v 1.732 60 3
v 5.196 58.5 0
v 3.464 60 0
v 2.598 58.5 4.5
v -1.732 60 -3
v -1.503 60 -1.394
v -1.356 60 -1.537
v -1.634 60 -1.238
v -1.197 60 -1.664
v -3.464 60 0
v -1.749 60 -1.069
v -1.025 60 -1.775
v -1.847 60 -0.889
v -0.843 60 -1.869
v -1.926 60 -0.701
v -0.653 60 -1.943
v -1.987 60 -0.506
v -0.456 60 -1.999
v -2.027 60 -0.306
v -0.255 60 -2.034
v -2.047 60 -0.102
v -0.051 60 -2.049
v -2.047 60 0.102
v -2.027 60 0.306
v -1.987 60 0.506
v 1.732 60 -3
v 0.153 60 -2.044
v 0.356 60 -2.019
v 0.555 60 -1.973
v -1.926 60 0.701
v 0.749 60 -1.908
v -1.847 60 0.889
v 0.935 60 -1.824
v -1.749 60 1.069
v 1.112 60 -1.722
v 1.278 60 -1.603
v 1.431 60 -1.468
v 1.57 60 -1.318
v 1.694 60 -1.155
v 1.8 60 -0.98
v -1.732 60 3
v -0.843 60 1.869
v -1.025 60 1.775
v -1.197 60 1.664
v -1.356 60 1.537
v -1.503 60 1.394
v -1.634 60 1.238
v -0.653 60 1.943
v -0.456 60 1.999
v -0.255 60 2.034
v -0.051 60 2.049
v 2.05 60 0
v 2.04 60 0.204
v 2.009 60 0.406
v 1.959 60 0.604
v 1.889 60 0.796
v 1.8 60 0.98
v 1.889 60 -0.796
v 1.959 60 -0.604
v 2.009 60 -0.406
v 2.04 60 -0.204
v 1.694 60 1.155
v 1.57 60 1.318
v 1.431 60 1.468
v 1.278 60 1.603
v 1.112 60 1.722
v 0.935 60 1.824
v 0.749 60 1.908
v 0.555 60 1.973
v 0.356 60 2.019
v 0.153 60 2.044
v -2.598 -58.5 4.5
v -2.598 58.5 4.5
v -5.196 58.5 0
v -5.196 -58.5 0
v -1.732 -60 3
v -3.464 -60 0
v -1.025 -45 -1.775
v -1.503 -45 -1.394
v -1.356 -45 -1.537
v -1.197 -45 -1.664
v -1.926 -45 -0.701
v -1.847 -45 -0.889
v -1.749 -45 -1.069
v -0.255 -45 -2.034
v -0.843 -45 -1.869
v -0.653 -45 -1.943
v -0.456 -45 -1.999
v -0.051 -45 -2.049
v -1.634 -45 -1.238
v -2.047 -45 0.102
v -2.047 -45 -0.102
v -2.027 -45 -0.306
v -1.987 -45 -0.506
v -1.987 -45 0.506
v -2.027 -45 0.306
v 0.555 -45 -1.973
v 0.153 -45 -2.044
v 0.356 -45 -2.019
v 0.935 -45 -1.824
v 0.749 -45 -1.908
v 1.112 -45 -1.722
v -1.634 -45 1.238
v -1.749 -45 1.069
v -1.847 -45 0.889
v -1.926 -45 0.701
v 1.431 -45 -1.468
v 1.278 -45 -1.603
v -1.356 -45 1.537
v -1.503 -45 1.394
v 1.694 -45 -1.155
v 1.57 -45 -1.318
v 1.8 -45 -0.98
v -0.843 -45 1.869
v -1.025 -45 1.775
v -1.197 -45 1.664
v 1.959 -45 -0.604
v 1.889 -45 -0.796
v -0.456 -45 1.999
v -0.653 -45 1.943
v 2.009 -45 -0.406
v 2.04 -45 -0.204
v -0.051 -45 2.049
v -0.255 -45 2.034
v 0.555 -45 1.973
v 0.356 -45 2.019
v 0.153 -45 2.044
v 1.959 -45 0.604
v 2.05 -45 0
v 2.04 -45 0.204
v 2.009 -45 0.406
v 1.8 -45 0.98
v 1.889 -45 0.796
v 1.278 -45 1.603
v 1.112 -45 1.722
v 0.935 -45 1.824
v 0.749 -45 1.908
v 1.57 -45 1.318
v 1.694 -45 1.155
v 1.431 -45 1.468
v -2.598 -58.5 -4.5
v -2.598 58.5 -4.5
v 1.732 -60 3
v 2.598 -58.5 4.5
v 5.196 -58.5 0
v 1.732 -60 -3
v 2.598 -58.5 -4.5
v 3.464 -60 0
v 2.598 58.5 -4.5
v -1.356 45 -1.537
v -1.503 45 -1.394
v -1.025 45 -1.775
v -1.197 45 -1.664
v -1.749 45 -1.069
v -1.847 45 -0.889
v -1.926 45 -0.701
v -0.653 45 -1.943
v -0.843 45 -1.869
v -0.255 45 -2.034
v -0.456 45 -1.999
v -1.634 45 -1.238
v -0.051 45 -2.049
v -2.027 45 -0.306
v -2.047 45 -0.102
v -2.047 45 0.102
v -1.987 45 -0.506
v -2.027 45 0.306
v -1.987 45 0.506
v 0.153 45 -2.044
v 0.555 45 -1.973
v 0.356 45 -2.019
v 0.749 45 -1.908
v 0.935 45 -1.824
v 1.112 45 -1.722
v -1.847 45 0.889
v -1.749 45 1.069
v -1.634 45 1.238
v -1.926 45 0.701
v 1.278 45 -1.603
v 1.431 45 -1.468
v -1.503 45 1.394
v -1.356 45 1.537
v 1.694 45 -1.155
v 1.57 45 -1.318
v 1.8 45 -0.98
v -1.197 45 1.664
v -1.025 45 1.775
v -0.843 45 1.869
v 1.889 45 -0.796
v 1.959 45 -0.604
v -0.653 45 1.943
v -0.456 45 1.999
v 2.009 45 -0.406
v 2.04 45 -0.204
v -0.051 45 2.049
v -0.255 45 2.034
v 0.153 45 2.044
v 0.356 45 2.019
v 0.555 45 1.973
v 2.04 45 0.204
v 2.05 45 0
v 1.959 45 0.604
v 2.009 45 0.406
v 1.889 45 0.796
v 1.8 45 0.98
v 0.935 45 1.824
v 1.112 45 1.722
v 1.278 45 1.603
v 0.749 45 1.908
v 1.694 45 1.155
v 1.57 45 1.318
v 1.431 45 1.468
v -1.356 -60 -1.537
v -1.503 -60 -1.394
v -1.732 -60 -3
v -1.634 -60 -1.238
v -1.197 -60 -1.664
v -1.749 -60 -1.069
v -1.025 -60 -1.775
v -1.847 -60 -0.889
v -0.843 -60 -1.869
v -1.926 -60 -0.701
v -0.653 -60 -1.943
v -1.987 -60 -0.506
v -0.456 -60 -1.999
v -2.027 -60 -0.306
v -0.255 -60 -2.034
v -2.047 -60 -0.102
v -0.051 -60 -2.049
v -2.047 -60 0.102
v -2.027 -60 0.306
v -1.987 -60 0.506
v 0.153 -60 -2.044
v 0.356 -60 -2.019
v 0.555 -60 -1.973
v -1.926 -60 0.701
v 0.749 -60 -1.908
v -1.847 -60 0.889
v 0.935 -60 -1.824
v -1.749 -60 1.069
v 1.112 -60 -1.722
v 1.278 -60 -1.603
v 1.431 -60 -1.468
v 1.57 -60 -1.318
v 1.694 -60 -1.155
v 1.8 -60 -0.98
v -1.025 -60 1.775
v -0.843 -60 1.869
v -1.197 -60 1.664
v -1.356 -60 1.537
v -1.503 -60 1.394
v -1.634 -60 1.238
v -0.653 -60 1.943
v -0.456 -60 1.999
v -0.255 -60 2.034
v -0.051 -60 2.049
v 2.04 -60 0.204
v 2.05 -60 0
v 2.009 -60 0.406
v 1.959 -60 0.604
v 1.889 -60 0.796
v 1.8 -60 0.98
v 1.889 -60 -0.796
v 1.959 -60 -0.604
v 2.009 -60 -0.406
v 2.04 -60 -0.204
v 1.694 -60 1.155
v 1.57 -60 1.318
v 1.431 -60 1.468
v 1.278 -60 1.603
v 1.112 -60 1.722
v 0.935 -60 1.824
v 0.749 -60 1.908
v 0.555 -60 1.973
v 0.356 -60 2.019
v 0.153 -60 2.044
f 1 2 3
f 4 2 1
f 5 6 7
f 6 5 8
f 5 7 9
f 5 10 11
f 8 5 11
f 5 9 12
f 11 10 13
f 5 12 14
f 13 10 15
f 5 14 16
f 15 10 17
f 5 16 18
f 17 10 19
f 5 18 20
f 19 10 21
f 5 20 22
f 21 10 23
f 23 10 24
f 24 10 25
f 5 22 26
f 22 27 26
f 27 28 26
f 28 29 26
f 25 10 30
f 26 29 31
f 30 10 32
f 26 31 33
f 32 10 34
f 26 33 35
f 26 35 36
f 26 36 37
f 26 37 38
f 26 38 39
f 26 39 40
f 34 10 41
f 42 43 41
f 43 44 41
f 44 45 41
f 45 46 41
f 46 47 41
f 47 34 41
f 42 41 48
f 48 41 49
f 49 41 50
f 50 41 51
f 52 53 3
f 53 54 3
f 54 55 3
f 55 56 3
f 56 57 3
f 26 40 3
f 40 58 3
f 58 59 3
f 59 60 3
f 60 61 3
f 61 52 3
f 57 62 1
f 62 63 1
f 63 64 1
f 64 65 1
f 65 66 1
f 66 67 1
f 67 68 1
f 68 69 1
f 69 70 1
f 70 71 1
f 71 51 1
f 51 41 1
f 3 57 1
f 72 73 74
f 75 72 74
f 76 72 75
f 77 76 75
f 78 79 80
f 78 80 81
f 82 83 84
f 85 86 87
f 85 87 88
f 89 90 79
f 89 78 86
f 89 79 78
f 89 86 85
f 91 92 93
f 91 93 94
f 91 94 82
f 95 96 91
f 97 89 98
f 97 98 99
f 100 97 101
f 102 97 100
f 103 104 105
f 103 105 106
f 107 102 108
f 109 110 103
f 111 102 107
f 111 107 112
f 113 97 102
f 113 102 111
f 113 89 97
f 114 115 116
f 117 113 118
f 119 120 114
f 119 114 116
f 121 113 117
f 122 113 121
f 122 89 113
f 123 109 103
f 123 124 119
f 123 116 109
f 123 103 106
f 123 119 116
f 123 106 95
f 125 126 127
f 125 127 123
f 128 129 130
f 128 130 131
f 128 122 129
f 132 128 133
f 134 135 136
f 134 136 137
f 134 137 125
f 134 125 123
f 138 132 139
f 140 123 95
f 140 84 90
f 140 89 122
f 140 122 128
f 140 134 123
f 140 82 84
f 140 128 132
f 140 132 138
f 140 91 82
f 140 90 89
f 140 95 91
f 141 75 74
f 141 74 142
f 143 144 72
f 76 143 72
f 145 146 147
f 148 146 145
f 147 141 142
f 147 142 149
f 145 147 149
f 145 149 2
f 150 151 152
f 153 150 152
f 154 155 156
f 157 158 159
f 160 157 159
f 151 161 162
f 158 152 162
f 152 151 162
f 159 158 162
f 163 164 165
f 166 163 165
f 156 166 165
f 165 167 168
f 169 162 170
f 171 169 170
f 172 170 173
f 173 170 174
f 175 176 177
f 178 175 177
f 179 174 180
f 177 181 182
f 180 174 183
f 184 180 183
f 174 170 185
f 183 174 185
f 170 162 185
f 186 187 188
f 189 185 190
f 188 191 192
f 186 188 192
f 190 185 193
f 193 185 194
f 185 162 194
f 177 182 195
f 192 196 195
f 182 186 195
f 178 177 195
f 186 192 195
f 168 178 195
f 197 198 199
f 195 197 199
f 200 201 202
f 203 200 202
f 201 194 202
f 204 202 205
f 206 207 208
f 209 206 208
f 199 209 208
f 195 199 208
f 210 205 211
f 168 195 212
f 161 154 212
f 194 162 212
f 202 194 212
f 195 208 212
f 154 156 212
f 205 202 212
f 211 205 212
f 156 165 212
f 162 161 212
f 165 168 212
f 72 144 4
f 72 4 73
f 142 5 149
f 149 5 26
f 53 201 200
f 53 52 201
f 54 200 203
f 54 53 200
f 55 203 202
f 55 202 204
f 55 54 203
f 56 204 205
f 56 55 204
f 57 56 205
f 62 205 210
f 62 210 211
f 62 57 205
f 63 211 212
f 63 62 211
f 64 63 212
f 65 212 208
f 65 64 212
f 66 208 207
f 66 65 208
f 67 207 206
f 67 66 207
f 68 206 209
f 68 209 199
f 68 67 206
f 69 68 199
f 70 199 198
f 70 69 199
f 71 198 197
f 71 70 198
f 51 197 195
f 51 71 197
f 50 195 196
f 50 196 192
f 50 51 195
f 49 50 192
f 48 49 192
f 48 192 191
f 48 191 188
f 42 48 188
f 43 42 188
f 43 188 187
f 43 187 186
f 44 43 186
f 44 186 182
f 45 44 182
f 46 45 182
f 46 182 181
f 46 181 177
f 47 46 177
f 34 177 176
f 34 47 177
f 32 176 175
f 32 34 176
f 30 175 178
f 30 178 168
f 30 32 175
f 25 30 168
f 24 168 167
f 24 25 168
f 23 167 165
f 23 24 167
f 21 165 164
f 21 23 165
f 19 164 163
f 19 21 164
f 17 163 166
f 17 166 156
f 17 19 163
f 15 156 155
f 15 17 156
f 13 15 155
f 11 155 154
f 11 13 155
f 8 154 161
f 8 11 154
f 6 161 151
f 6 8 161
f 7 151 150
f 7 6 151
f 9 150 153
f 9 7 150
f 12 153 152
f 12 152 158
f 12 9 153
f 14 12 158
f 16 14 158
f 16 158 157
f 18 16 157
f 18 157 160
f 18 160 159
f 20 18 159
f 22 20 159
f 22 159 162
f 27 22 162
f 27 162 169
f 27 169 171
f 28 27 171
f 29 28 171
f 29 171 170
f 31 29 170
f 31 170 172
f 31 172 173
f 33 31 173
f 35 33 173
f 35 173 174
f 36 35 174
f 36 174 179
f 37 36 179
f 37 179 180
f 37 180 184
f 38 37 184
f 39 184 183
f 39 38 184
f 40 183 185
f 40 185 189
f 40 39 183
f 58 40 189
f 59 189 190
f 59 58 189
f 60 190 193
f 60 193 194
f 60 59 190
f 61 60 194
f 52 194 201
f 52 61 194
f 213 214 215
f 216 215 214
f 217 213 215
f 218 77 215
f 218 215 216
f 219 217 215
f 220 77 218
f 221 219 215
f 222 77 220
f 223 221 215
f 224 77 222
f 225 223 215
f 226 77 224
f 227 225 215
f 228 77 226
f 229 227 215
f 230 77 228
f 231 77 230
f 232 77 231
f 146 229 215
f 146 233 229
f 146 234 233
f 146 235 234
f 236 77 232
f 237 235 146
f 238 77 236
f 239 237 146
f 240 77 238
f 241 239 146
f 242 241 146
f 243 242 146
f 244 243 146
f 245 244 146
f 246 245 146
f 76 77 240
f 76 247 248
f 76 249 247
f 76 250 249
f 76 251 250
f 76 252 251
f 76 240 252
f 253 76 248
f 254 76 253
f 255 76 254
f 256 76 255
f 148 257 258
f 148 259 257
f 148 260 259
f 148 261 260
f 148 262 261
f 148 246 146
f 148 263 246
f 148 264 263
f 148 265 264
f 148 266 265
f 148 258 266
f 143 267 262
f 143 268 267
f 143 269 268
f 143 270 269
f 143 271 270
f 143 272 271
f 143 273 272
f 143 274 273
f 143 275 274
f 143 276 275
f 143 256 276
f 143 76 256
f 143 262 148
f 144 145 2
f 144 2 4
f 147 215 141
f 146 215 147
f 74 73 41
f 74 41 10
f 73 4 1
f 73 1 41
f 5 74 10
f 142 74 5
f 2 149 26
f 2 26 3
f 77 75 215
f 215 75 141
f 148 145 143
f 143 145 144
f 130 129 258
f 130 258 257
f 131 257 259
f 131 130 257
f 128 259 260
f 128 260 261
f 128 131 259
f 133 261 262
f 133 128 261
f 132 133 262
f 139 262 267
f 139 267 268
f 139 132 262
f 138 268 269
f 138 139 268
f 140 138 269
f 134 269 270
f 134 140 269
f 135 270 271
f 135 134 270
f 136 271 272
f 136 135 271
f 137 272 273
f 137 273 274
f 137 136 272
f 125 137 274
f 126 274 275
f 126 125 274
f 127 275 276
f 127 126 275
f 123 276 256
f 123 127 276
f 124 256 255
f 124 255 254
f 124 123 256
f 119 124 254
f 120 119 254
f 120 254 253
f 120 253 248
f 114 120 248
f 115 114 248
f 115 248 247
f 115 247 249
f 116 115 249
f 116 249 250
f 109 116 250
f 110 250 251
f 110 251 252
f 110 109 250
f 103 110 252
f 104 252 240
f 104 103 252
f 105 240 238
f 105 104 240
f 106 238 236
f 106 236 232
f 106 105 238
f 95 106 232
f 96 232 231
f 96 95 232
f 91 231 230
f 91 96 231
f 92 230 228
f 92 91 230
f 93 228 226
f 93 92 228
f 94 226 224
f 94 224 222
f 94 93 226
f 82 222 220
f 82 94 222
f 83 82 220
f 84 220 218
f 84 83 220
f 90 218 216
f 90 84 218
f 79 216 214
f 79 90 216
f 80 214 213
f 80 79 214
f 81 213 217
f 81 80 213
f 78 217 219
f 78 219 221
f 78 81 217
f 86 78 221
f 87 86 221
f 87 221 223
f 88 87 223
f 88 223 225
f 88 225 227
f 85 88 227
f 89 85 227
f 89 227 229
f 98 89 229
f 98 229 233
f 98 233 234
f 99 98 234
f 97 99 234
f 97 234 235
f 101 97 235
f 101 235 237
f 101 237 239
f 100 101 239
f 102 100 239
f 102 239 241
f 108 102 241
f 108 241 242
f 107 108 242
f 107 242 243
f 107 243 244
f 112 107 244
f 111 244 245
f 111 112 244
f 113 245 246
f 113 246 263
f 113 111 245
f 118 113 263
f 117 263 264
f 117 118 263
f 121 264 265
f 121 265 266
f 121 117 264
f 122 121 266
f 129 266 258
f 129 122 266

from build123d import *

# Parameters (mm, degrees)
F1_R     = 2.05
F2_DEPTH = 60
F3_DEPTH = 45
F4_SIZE  = 1.5


with BuildPart() as f2:
    # F1 (on Front) → F2 (new body, symmetric)
    with BuildSketch(Plane.XZ):
        Polygon((-2.5980762114, -4.5), (2.5980762114, -4.5), (5.1961524227, 0), (2.5980762114, 4.5), (-2.5980762114, 4.5), (-5.1961524227, 0), align=None)
        Circle(F1_R, mode=Mode.SUBTRACT)
    extrude(amount=F2_DEPTH, both=True)

    # F1 (on Front) → F3 (join, symmetric)
    with BuildSketch(Plane.XZ):
        Circle(F1_R)
    extrude(amount=F3_DEPTH, both=True)

    # F4
    f4_edges = [f2.edges().sort_by_distance(p)[0] for p in [
        (3.897114, -60, 2.25),
        (0, -60, 4.5),
        (-3.897114, -60, 2.25),
        (-3.897114, -60, -2.25),
        (0, -60, -4.5),
        (3.897114, -60, -2.25),
        (3.897114, 60, 2.25),
        (0, 60, 4.5),
        (-3.897114, 60, 2.25),
        (-3.897114, 60, -2.25),
        (0, 60, -4.5),
        (3.897114, 60, -2.25),
    ]]
    chamfer(f4_edges, length=F4_SIZE)


solid = f2.part
